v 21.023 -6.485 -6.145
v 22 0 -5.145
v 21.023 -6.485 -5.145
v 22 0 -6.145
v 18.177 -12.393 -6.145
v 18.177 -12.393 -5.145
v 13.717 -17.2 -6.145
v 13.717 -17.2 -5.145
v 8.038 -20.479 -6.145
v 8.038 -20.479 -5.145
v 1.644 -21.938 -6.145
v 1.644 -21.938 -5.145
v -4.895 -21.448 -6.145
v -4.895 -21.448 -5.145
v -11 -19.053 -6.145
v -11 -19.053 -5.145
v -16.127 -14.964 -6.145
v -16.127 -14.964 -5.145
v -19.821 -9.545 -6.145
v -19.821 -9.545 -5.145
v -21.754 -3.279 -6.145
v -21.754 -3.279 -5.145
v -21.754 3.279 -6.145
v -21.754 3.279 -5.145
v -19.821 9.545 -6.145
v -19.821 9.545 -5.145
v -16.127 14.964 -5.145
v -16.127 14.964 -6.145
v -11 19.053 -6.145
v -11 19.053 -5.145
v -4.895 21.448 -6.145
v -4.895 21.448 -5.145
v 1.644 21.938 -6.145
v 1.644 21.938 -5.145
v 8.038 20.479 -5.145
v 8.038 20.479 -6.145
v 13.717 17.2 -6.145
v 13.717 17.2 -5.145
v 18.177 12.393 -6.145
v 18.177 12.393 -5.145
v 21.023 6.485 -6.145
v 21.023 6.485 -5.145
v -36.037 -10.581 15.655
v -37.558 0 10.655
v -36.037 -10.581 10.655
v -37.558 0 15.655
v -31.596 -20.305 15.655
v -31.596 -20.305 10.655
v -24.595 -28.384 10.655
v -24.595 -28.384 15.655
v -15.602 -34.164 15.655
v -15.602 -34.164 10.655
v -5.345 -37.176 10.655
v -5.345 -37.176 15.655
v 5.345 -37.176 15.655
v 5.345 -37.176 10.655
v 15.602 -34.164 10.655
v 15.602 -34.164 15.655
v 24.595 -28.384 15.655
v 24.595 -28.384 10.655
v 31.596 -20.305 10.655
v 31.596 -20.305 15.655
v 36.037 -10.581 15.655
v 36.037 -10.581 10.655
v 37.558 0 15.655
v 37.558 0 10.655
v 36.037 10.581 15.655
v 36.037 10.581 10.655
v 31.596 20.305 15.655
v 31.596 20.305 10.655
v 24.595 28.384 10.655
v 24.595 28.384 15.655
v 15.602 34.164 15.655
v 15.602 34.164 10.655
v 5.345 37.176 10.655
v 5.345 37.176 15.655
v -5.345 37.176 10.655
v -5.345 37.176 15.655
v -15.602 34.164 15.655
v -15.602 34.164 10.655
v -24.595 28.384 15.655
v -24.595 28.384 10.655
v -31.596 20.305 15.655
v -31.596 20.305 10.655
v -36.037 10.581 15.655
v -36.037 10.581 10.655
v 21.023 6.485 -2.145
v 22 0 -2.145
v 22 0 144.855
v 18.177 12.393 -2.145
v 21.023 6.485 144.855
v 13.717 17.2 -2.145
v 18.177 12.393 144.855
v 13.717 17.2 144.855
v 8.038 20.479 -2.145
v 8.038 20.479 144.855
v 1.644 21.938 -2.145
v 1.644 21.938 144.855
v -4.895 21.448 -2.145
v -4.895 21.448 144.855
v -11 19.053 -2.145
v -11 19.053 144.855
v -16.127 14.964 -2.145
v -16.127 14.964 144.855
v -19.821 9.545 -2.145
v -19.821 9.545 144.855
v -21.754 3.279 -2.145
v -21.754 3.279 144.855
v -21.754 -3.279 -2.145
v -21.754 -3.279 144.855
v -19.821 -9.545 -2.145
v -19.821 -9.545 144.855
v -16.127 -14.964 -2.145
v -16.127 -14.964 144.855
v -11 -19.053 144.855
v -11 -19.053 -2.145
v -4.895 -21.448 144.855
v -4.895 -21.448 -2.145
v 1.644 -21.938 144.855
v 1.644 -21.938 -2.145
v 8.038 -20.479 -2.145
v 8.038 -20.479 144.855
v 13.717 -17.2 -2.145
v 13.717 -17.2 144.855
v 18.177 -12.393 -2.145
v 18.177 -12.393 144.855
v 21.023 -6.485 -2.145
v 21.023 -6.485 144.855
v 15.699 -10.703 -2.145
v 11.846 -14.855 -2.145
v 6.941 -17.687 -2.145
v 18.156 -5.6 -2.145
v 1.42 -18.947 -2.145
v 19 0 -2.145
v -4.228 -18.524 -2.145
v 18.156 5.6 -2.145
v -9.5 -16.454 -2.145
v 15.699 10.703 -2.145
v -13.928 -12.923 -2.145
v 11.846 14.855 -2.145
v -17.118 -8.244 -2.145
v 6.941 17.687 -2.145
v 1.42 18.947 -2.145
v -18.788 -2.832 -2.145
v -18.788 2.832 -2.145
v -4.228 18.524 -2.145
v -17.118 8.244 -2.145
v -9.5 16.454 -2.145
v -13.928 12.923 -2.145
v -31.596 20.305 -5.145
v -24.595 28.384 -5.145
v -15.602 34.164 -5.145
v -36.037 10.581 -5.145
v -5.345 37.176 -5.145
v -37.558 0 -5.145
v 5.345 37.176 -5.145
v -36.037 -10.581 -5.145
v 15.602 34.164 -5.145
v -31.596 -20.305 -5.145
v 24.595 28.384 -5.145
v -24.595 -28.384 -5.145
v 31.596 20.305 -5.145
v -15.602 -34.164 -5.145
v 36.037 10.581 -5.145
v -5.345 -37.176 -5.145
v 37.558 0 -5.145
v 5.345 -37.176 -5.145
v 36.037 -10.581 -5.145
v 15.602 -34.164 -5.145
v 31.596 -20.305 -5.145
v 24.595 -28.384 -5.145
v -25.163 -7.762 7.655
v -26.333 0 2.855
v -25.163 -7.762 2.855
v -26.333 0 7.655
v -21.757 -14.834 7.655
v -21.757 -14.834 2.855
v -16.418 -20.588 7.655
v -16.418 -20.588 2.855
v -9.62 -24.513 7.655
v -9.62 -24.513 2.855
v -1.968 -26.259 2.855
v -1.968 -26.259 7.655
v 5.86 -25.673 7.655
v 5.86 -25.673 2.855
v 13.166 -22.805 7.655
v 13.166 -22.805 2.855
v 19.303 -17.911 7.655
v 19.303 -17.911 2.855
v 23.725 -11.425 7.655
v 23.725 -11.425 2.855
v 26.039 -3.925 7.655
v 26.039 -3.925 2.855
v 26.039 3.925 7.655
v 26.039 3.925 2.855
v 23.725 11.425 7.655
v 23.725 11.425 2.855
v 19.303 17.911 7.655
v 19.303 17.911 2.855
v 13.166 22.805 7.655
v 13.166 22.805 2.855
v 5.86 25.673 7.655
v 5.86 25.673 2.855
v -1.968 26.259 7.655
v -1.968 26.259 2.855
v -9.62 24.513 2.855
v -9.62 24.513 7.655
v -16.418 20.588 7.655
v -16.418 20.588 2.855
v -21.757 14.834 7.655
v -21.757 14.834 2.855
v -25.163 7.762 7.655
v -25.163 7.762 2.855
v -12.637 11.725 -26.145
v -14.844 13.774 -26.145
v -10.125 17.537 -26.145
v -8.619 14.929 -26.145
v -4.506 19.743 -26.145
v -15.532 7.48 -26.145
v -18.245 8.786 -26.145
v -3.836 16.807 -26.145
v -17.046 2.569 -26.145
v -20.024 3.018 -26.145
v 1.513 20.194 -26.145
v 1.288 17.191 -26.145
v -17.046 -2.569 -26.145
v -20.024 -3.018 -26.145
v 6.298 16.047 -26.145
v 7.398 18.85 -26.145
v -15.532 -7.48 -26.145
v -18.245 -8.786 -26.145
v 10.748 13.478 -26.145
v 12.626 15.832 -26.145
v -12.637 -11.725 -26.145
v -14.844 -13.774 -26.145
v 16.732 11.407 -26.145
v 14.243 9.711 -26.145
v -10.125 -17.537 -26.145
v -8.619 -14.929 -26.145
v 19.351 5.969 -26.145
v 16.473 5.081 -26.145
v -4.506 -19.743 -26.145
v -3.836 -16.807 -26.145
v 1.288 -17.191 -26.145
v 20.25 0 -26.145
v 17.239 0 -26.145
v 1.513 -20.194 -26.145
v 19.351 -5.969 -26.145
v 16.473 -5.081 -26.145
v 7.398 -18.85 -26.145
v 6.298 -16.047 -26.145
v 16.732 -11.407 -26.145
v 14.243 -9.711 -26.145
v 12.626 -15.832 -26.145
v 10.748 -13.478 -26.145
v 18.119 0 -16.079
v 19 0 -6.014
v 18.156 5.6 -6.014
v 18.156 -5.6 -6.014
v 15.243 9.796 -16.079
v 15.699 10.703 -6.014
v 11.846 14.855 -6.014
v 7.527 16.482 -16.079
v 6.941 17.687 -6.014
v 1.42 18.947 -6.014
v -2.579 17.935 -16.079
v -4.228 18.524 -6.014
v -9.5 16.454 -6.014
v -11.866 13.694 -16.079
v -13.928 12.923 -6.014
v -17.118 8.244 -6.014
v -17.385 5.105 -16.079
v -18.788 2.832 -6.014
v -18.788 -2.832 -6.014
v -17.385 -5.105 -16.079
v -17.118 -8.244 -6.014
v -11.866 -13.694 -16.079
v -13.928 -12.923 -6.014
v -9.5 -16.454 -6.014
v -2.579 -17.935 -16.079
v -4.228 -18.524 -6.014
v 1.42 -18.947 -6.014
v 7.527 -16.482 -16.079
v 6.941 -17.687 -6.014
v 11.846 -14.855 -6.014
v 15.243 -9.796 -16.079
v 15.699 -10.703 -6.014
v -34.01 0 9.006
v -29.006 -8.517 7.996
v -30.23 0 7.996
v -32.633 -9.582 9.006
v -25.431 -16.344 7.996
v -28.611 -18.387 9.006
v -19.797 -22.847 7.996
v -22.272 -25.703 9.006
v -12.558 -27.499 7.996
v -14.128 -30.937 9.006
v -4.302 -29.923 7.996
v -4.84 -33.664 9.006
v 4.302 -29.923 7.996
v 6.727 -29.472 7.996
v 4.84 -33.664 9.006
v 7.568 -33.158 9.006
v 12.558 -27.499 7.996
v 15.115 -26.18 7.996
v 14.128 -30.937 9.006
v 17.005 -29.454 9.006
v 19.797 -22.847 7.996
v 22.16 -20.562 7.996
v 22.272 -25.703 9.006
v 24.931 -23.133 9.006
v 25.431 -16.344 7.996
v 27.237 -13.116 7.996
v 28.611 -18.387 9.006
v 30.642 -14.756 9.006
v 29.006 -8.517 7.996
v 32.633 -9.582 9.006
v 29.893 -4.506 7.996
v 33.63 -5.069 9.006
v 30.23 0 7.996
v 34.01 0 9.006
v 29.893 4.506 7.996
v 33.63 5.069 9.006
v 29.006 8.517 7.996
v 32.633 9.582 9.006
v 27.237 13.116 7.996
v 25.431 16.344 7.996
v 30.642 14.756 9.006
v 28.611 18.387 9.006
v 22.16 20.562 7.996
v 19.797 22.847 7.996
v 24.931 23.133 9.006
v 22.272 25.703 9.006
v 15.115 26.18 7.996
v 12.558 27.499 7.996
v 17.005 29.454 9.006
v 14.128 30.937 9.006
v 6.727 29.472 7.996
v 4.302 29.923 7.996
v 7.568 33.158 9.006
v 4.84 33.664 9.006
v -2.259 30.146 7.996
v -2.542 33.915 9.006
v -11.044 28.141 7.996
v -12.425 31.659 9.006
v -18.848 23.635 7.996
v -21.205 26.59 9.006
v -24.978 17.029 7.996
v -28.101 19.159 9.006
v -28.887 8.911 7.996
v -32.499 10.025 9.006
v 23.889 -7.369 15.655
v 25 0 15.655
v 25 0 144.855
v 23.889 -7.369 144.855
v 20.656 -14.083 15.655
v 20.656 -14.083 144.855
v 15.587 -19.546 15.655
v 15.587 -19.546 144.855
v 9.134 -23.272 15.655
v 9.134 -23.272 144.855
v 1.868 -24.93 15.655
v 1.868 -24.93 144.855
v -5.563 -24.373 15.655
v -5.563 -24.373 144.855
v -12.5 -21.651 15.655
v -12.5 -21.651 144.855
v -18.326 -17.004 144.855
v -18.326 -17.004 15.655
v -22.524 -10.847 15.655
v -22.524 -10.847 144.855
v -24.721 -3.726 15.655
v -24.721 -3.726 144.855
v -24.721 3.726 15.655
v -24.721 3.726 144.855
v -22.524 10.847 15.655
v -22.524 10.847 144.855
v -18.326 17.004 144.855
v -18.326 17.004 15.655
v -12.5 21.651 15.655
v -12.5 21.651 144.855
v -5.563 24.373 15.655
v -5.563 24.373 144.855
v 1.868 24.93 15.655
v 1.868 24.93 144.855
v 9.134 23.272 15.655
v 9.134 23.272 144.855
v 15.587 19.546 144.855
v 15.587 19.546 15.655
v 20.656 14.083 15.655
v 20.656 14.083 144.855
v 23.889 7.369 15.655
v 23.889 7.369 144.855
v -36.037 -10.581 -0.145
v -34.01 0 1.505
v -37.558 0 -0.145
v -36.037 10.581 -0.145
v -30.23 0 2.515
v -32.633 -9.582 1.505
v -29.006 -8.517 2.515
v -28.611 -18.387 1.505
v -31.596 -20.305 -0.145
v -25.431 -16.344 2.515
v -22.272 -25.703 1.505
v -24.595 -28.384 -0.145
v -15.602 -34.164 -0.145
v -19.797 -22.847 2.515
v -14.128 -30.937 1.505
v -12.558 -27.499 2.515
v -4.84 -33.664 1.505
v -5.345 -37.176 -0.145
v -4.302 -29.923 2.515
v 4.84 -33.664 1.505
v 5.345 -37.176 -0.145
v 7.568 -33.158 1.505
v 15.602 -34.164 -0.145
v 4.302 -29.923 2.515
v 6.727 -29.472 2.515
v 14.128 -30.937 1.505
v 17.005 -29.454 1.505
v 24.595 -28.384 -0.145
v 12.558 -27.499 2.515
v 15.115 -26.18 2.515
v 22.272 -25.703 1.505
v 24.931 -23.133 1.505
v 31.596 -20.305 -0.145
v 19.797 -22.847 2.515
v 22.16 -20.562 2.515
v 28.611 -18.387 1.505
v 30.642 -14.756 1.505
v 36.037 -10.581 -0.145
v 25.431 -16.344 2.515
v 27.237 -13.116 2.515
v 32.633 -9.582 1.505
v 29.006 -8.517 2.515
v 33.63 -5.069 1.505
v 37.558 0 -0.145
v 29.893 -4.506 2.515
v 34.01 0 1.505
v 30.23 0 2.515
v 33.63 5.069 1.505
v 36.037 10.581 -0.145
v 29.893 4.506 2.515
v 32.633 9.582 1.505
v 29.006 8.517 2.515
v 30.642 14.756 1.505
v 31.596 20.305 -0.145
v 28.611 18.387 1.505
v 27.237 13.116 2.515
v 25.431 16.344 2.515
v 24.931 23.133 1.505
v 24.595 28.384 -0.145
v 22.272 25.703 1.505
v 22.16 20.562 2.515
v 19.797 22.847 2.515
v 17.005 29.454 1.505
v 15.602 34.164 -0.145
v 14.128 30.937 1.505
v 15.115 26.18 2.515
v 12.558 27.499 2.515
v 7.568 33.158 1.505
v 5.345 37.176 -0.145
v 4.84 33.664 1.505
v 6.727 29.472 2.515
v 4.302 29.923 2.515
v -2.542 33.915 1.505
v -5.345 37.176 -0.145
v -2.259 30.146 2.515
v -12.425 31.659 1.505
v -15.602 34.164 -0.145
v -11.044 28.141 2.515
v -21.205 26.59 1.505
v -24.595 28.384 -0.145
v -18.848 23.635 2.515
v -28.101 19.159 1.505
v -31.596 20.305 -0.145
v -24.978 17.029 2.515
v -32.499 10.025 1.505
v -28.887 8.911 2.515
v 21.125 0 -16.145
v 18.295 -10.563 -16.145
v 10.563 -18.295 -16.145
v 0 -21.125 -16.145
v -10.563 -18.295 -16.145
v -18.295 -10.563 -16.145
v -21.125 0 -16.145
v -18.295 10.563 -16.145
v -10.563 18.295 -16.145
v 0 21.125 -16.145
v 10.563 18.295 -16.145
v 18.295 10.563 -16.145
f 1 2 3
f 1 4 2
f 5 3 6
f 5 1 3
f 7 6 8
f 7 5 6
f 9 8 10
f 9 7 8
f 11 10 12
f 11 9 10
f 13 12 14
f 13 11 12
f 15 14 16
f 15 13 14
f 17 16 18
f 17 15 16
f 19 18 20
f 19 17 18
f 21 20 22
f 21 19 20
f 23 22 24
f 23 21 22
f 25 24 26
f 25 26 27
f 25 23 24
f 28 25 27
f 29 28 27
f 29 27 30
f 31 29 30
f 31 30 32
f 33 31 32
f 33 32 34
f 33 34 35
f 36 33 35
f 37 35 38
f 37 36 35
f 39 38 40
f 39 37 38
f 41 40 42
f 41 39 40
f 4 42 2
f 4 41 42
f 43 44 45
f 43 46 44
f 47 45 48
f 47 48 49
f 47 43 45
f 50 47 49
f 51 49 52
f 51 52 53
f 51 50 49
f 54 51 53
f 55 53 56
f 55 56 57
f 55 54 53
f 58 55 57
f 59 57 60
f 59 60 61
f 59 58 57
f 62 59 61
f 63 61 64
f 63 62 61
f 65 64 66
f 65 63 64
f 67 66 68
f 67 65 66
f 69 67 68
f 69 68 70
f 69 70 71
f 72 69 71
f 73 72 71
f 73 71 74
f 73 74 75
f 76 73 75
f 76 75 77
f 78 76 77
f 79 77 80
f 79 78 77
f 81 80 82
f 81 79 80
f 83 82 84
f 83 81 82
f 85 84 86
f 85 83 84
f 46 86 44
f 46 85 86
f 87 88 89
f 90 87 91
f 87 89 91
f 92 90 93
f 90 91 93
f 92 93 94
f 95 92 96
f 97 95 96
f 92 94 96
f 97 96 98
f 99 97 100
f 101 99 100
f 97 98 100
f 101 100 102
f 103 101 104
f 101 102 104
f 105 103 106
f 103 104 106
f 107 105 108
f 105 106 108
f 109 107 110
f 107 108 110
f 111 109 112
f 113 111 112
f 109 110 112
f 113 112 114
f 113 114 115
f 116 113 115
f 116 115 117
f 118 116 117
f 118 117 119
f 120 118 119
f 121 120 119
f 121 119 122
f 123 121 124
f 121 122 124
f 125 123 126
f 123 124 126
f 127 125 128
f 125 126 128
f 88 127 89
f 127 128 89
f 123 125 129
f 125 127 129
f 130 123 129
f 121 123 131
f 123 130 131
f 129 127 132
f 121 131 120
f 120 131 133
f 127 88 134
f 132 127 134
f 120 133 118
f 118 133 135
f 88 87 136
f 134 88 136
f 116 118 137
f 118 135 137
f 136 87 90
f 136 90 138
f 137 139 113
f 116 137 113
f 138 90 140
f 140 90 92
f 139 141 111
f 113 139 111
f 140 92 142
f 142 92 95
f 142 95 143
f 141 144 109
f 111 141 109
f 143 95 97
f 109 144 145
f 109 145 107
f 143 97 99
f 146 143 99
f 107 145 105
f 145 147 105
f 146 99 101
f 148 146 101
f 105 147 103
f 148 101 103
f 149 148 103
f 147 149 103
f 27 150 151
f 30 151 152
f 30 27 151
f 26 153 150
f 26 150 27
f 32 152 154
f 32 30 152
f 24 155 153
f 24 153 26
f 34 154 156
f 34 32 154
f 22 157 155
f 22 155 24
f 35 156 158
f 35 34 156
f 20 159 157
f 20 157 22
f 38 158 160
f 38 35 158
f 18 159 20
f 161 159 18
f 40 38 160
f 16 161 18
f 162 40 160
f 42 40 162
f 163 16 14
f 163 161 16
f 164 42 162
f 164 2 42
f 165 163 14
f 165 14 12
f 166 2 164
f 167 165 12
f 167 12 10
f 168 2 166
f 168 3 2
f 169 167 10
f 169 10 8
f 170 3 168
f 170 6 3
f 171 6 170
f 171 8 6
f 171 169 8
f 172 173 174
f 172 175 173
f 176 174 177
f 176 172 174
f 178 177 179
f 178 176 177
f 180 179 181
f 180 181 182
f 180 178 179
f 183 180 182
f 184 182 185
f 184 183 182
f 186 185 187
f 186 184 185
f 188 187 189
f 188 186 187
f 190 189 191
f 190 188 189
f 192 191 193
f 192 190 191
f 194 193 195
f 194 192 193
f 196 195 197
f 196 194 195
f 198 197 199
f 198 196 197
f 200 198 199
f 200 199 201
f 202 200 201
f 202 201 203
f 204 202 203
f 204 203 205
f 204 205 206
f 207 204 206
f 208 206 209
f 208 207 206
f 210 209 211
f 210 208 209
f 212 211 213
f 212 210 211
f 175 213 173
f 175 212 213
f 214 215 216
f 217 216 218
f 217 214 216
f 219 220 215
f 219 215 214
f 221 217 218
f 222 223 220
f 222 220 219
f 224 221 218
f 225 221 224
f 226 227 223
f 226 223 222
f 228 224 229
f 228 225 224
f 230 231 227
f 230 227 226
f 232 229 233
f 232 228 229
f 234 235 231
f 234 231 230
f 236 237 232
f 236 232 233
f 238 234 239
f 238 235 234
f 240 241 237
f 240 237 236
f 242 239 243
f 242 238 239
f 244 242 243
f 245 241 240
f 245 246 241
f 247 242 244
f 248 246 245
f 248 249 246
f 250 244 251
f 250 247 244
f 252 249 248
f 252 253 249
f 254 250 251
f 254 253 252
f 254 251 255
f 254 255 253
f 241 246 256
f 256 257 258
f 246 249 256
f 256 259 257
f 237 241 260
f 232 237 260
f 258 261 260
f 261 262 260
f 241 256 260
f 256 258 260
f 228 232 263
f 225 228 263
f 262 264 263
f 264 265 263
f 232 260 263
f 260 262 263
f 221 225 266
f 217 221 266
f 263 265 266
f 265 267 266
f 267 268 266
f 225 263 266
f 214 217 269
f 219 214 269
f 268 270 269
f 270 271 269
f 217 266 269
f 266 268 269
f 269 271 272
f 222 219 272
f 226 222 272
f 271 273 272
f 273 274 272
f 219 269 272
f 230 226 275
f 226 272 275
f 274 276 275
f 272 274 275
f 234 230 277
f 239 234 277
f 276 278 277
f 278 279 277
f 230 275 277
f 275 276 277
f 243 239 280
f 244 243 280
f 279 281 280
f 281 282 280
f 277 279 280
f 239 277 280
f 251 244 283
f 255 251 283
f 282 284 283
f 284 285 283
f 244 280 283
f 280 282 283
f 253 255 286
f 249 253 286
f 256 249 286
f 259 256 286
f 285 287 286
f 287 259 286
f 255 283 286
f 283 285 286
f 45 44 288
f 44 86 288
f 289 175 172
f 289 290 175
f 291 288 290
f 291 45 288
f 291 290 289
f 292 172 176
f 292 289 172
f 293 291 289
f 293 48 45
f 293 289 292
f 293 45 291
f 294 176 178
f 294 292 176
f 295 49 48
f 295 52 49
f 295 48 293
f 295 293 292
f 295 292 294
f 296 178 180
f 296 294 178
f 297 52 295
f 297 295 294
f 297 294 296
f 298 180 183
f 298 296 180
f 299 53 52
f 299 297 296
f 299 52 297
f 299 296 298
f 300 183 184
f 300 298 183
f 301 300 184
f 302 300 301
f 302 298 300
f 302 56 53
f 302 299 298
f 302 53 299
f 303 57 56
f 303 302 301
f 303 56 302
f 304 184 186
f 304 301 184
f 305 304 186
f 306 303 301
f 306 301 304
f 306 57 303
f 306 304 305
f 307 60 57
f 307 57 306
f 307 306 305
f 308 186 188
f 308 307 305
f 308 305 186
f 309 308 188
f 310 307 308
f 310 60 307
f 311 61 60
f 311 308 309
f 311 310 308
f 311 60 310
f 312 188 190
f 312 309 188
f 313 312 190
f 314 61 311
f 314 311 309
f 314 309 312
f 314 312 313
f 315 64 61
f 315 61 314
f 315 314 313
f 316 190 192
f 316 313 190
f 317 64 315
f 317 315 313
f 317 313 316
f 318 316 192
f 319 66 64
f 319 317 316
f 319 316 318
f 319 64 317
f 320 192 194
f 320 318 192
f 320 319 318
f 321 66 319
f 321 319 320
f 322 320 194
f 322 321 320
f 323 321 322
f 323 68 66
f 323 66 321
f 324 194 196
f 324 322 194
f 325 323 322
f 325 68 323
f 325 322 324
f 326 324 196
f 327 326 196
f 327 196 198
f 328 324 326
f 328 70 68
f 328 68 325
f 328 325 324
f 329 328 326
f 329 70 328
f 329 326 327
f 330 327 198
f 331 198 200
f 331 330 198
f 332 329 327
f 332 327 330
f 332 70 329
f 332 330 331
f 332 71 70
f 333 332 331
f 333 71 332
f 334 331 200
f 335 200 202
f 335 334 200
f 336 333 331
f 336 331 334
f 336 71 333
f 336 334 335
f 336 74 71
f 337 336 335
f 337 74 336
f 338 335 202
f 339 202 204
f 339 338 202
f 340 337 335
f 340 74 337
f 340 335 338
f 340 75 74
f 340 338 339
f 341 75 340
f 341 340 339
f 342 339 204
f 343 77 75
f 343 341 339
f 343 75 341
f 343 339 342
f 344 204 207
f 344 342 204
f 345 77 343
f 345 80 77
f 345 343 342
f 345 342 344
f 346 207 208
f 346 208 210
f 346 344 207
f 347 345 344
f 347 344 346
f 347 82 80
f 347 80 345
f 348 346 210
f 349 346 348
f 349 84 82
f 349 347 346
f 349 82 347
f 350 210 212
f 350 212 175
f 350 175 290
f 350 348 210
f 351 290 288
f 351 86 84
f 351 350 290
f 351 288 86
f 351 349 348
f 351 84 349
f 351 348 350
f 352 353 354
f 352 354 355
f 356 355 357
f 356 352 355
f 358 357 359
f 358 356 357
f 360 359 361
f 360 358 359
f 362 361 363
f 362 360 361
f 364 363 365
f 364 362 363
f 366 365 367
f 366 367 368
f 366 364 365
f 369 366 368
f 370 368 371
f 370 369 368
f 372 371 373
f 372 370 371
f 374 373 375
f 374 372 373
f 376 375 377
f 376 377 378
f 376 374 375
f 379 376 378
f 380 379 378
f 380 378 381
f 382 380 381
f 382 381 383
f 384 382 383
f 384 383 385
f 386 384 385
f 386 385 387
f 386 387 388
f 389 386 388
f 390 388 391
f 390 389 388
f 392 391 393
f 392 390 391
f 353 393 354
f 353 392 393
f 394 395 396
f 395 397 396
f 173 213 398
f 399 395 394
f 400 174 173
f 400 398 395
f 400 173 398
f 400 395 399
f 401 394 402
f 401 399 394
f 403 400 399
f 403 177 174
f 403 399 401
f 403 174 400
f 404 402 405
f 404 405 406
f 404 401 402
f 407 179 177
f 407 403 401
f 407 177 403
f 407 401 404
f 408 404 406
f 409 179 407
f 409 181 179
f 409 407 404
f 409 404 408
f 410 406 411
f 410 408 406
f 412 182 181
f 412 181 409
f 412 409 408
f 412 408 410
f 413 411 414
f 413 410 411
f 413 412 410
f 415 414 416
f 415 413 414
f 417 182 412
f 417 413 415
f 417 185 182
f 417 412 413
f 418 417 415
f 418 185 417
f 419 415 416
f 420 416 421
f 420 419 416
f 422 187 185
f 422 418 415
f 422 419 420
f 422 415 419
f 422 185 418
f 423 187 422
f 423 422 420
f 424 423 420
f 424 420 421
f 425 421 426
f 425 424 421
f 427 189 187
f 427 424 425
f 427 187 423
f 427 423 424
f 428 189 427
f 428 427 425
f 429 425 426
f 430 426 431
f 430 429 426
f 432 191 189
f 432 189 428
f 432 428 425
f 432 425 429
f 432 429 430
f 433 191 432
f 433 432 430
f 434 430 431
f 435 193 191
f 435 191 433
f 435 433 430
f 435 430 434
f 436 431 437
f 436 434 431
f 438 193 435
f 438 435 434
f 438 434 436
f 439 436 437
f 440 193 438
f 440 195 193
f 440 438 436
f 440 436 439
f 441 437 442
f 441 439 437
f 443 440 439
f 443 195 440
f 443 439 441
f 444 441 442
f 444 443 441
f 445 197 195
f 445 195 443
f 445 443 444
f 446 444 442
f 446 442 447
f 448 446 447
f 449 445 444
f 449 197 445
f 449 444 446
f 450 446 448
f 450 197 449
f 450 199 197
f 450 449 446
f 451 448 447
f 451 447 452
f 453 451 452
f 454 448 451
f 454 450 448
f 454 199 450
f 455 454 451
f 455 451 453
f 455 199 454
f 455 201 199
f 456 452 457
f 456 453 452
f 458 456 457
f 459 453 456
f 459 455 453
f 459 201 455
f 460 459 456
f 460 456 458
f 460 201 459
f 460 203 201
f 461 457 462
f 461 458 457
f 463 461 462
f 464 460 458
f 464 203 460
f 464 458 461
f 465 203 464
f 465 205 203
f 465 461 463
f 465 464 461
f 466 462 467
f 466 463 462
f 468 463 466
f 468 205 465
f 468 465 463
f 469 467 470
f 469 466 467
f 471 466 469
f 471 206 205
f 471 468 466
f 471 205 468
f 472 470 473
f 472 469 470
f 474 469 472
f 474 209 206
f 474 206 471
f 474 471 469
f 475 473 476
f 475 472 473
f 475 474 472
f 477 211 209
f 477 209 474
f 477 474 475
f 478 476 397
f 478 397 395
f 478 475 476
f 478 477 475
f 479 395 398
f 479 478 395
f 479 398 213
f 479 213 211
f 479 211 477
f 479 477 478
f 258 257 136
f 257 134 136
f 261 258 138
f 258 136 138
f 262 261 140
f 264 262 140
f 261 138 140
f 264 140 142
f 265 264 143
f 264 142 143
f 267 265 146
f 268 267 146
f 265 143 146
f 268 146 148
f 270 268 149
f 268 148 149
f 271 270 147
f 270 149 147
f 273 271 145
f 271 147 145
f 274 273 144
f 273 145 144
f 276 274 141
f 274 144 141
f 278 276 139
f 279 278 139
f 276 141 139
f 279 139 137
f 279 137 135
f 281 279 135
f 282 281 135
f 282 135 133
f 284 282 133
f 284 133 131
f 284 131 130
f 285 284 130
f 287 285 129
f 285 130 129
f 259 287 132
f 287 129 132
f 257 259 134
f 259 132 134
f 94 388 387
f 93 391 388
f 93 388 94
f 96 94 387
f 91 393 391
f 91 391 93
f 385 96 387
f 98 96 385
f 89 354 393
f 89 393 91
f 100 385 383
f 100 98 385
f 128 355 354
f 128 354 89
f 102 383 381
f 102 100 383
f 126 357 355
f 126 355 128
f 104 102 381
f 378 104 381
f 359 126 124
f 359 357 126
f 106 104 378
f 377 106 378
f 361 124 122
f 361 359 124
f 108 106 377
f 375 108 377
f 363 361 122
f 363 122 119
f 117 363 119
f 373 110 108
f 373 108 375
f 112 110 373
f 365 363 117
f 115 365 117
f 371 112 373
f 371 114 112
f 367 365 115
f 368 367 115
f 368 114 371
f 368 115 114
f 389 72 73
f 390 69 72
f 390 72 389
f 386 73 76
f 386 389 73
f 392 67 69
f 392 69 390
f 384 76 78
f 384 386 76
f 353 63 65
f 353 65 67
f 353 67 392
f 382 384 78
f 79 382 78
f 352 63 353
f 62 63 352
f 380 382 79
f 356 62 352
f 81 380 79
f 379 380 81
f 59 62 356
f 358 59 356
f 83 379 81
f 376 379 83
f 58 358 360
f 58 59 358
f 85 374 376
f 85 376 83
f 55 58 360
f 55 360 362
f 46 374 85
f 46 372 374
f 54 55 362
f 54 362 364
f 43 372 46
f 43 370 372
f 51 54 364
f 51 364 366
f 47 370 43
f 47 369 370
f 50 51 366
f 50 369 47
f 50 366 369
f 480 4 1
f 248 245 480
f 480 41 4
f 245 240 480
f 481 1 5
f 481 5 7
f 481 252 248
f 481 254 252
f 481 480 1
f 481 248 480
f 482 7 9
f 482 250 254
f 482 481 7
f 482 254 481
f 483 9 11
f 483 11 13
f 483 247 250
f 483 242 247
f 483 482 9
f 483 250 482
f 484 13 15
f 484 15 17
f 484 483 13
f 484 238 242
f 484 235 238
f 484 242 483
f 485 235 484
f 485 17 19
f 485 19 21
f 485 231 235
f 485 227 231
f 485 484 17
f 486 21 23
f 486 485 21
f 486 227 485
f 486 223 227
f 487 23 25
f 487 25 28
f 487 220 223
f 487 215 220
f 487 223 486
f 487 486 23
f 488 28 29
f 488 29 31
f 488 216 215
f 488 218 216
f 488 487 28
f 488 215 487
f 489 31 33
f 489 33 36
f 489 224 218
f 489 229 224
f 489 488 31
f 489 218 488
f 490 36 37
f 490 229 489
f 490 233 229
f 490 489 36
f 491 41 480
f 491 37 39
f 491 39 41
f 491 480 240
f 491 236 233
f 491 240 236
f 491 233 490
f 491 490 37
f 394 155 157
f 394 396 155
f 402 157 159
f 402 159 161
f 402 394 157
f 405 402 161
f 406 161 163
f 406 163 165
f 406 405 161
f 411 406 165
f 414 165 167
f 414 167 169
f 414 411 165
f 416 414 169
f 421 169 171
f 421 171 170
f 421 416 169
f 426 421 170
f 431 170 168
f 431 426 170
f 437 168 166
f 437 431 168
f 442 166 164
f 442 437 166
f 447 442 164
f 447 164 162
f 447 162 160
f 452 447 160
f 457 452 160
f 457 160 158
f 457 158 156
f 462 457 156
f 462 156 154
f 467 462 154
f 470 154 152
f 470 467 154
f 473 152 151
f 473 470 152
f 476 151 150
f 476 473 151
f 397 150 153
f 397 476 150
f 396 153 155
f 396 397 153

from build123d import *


# Read off the part's stored shape, not the designer's step: Shell1
with BuildPart() as part:
    # Sketch3 → Revolve1 (revolve)
    with BuildSketch(Plane(origin=(0, 0, 0), x_dir=(0, 0, -1), z_dir=(1, 0, 0)), mode=Mode.PRIVATE) as revolve1_sk:
        Polygon((-144.855352602, 25), (5.144647398, 25), (5.144647398, 22), (6.144647398, 22), (26.144647398, 20.250226729), (26.144647398, 0), (-144.855352602, 0), align=None)
    revolve(revolve1_sk.sketch.rotate(Axis((0, 0, 32.959641256), (0, 0, -1)), 90), axis=Axis((0, 0, 32.959641256), (0, 0, -1)))

    # Shell1 outline → Shell1 (revolve, cut)
    with BuildSketch(Plane.XZ):
        Polygon((19, -2.144647398), (22, -2.144647398), (22, 144.855352602), (0, 144.855352602), (0, -26.144647398), (17.238767217, -26.144647398), (19, -6.013664569), align=None)
    revolve(axis=Axis((0, 0, 0), (0, 0, 1)), mode=Mode.SUBTRACT)

    # Sketch4 → Revolve3 (revolve)
    with BuildSketch(Plane(origin=(0, 0, 0), x_dir=(0, 0, -1), z_dir=(1, 0, 0)), mode=Mode.PRIVATE) as revolve3_sk:
        with BuildLine():
            Line((-15.655352602, 37.557879022), (-15.655352602, 25))
            Line((-15.655352602, 25), (5.144647398, 25))
            Line((5.144647398, 25), (5.144647398, 37.557879022))
            Line((5.144647398, 37.557879022), (0.144647398, 37.557879022))
            ThreePointArc((0.144647398, 37.557879022), (-2.092417968, 32.142324694), (-2.855352602, 26.332796239))
            Line((-2.855352602, 26.332796239), (-7.655352602, 26.332796239))
            ThreePointArc((-7.655352602, 26.332796239), (-8.418287237, 32.142324694), (-10.655352602, 37.557879022))
            Line((-10.655352602, 37.557879022), (-15.655352602, 37.557879022))
        make_face()
    revolve(revolve3_sk.sketch.rotate(Axis((0, 0, -29.694647398), (0, 0, 1)), 90), axis=Axis((0, 0, -29.694647398), (0, 0, 1)))


solid = part.part
